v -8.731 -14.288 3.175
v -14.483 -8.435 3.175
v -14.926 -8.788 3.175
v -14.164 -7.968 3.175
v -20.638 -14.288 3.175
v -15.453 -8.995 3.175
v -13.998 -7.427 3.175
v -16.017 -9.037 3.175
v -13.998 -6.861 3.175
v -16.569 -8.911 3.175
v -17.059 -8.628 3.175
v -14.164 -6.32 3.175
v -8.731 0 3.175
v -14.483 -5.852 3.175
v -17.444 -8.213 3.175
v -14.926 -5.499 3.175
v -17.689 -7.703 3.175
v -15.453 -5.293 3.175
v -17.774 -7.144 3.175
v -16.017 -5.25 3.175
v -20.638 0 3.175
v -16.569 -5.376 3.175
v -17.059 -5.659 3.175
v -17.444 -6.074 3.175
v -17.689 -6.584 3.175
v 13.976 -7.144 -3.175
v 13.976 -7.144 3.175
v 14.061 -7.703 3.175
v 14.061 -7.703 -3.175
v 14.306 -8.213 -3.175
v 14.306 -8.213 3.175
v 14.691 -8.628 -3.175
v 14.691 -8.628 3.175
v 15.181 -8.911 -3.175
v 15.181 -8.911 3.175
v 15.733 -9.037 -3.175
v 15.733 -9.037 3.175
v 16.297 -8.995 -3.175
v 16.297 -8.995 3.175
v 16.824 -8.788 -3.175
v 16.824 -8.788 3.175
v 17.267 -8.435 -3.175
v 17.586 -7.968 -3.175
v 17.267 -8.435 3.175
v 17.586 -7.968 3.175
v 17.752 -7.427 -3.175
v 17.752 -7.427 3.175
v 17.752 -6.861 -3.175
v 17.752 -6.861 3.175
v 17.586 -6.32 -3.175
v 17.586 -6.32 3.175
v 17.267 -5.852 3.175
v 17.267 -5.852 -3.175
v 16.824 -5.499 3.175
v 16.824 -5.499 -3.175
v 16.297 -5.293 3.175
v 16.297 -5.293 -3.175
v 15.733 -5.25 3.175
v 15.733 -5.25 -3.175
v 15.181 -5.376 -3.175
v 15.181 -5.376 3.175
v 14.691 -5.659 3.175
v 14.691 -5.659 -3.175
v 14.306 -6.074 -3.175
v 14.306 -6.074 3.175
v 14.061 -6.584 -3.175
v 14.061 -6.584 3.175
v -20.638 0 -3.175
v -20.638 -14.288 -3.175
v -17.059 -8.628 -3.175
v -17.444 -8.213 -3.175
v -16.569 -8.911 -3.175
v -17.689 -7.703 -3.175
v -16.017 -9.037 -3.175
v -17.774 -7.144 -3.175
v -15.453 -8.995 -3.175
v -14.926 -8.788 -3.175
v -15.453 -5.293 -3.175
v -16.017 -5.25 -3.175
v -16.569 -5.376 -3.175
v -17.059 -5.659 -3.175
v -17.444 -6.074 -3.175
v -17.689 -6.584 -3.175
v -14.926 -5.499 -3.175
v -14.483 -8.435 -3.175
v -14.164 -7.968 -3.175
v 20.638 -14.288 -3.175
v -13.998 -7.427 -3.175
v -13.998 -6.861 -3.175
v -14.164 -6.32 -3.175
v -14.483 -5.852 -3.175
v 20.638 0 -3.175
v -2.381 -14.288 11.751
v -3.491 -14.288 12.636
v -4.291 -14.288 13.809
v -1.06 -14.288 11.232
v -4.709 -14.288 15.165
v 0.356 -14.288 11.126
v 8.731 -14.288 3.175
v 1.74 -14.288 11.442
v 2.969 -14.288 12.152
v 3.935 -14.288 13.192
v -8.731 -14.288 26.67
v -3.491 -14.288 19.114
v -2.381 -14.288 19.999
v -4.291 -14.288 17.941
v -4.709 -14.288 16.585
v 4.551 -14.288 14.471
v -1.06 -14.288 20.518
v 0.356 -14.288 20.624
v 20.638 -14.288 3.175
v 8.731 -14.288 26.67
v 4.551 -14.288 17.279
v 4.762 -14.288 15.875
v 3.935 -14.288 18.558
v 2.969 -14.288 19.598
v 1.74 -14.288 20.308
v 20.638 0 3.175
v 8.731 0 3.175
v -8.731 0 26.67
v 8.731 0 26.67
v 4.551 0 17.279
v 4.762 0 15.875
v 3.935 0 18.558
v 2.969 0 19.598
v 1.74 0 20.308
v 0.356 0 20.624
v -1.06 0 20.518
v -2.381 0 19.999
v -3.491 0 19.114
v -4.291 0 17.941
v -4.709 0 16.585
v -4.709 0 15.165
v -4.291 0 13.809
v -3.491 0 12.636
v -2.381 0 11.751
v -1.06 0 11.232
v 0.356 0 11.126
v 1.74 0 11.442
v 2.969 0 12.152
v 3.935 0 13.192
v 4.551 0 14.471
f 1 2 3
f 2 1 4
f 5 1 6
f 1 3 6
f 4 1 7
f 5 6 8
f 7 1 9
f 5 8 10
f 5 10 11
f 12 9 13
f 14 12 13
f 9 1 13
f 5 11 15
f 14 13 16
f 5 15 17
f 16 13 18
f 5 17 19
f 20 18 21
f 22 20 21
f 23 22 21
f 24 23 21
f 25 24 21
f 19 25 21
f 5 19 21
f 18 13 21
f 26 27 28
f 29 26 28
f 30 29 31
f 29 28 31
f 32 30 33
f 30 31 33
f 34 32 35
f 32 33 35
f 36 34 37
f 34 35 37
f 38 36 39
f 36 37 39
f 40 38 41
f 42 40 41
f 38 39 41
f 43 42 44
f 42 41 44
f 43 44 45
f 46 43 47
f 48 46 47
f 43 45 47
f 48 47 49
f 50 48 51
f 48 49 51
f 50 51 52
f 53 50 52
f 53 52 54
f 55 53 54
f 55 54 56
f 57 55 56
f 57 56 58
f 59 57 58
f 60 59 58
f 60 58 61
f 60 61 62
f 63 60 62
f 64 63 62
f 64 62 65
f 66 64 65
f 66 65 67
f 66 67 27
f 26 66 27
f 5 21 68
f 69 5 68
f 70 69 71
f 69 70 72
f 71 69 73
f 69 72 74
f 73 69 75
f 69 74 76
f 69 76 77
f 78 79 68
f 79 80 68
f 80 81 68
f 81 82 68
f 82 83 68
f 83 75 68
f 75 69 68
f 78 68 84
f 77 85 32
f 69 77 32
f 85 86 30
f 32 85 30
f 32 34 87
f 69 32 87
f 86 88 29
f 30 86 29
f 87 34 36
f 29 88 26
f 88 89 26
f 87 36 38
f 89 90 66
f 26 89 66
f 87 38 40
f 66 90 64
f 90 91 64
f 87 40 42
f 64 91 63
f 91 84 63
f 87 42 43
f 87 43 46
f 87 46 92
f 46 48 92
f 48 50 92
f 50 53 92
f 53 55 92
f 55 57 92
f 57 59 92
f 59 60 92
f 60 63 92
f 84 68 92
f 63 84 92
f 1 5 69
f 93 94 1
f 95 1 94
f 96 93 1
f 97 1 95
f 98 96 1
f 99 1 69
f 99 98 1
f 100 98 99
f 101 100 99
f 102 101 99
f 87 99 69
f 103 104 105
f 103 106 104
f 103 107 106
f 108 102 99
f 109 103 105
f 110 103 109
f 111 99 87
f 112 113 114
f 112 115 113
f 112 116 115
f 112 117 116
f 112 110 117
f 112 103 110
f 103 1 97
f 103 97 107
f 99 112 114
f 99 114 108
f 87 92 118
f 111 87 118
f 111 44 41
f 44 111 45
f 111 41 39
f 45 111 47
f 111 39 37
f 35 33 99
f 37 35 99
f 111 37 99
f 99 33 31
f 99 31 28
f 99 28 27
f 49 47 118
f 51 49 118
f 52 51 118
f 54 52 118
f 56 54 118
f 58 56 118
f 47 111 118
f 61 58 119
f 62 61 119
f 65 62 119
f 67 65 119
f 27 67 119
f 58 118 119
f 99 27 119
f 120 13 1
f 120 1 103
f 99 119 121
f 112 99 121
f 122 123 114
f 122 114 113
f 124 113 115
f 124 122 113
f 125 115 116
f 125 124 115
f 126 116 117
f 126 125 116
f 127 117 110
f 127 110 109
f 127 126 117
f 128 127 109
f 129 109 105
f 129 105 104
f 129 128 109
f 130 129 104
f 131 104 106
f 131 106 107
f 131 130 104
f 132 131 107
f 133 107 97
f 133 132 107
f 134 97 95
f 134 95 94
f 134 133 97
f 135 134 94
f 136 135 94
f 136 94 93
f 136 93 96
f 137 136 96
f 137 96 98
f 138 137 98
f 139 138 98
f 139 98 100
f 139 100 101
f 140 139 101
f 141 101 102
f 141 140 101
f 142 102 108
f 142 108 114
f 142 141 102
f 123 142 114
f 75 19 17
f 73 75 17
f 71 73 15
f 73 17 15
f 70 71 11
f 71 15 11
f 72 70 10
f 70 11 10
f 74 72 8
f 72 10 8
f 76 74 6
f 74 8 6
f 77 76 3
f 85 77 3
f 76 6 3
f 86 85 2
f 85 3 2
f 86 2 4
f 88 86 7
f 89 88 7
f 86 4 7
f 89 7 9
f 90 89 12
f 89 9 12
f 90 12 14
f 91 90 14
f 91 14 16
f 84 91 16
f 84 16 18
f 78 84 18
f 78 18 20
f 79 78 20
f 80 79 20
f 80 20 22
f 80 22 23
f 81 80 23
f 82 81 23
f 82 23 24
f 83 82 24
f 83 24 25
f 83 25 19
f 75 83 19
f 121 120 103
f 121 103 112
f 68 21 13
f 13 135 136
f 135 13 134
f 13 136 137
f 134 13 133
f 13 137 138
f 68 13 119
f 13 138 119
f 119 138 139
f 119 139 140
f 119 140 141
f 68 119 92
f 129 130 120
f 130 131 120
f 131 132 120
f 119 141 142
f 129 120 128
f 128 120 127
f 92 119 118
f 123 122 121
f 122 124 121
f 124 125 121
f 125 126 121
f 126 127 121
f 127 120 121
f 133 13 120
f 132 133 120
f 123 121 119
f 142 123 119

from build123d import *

# Parameters (mm, degrees)
F0_W     = 17.4625
F0_H     = 23.495
F0_R     = 4.7625
F1_DEPTH = 14.2875
F3_D     = 3.7973


with BuildPart() as f1:
    # F0 (on Front) → F1 (new body)
    with BuildSketch(Plane.XZ):
        with Locations((0, 14.9225)):
            Rectangle(F0_W, F0_H)
        with Locations((0, 15.875)):
            Circle(F0_R, mode=Mode.SUBTRACT)
        Polygon((20.6375, -3.175), (20.6375, 3.175), (8.73125, 3.175), (-8.73125, 3.175), (-20.6375, 3.175), (-20.6375, -3.175), align=None)
    extrude(amount=F1_DEPTH)

    # F3 (through all)
    with Locations(Plane(origin=(0, 0, -3.175), x_dir=(1, 0, 0), z_dir=(0, 0, -1))):
        with Locations((-15.875, 7.14375), (15.875, 7.14375)):
            Hole(F3_D / 2)


solid = f1.part
